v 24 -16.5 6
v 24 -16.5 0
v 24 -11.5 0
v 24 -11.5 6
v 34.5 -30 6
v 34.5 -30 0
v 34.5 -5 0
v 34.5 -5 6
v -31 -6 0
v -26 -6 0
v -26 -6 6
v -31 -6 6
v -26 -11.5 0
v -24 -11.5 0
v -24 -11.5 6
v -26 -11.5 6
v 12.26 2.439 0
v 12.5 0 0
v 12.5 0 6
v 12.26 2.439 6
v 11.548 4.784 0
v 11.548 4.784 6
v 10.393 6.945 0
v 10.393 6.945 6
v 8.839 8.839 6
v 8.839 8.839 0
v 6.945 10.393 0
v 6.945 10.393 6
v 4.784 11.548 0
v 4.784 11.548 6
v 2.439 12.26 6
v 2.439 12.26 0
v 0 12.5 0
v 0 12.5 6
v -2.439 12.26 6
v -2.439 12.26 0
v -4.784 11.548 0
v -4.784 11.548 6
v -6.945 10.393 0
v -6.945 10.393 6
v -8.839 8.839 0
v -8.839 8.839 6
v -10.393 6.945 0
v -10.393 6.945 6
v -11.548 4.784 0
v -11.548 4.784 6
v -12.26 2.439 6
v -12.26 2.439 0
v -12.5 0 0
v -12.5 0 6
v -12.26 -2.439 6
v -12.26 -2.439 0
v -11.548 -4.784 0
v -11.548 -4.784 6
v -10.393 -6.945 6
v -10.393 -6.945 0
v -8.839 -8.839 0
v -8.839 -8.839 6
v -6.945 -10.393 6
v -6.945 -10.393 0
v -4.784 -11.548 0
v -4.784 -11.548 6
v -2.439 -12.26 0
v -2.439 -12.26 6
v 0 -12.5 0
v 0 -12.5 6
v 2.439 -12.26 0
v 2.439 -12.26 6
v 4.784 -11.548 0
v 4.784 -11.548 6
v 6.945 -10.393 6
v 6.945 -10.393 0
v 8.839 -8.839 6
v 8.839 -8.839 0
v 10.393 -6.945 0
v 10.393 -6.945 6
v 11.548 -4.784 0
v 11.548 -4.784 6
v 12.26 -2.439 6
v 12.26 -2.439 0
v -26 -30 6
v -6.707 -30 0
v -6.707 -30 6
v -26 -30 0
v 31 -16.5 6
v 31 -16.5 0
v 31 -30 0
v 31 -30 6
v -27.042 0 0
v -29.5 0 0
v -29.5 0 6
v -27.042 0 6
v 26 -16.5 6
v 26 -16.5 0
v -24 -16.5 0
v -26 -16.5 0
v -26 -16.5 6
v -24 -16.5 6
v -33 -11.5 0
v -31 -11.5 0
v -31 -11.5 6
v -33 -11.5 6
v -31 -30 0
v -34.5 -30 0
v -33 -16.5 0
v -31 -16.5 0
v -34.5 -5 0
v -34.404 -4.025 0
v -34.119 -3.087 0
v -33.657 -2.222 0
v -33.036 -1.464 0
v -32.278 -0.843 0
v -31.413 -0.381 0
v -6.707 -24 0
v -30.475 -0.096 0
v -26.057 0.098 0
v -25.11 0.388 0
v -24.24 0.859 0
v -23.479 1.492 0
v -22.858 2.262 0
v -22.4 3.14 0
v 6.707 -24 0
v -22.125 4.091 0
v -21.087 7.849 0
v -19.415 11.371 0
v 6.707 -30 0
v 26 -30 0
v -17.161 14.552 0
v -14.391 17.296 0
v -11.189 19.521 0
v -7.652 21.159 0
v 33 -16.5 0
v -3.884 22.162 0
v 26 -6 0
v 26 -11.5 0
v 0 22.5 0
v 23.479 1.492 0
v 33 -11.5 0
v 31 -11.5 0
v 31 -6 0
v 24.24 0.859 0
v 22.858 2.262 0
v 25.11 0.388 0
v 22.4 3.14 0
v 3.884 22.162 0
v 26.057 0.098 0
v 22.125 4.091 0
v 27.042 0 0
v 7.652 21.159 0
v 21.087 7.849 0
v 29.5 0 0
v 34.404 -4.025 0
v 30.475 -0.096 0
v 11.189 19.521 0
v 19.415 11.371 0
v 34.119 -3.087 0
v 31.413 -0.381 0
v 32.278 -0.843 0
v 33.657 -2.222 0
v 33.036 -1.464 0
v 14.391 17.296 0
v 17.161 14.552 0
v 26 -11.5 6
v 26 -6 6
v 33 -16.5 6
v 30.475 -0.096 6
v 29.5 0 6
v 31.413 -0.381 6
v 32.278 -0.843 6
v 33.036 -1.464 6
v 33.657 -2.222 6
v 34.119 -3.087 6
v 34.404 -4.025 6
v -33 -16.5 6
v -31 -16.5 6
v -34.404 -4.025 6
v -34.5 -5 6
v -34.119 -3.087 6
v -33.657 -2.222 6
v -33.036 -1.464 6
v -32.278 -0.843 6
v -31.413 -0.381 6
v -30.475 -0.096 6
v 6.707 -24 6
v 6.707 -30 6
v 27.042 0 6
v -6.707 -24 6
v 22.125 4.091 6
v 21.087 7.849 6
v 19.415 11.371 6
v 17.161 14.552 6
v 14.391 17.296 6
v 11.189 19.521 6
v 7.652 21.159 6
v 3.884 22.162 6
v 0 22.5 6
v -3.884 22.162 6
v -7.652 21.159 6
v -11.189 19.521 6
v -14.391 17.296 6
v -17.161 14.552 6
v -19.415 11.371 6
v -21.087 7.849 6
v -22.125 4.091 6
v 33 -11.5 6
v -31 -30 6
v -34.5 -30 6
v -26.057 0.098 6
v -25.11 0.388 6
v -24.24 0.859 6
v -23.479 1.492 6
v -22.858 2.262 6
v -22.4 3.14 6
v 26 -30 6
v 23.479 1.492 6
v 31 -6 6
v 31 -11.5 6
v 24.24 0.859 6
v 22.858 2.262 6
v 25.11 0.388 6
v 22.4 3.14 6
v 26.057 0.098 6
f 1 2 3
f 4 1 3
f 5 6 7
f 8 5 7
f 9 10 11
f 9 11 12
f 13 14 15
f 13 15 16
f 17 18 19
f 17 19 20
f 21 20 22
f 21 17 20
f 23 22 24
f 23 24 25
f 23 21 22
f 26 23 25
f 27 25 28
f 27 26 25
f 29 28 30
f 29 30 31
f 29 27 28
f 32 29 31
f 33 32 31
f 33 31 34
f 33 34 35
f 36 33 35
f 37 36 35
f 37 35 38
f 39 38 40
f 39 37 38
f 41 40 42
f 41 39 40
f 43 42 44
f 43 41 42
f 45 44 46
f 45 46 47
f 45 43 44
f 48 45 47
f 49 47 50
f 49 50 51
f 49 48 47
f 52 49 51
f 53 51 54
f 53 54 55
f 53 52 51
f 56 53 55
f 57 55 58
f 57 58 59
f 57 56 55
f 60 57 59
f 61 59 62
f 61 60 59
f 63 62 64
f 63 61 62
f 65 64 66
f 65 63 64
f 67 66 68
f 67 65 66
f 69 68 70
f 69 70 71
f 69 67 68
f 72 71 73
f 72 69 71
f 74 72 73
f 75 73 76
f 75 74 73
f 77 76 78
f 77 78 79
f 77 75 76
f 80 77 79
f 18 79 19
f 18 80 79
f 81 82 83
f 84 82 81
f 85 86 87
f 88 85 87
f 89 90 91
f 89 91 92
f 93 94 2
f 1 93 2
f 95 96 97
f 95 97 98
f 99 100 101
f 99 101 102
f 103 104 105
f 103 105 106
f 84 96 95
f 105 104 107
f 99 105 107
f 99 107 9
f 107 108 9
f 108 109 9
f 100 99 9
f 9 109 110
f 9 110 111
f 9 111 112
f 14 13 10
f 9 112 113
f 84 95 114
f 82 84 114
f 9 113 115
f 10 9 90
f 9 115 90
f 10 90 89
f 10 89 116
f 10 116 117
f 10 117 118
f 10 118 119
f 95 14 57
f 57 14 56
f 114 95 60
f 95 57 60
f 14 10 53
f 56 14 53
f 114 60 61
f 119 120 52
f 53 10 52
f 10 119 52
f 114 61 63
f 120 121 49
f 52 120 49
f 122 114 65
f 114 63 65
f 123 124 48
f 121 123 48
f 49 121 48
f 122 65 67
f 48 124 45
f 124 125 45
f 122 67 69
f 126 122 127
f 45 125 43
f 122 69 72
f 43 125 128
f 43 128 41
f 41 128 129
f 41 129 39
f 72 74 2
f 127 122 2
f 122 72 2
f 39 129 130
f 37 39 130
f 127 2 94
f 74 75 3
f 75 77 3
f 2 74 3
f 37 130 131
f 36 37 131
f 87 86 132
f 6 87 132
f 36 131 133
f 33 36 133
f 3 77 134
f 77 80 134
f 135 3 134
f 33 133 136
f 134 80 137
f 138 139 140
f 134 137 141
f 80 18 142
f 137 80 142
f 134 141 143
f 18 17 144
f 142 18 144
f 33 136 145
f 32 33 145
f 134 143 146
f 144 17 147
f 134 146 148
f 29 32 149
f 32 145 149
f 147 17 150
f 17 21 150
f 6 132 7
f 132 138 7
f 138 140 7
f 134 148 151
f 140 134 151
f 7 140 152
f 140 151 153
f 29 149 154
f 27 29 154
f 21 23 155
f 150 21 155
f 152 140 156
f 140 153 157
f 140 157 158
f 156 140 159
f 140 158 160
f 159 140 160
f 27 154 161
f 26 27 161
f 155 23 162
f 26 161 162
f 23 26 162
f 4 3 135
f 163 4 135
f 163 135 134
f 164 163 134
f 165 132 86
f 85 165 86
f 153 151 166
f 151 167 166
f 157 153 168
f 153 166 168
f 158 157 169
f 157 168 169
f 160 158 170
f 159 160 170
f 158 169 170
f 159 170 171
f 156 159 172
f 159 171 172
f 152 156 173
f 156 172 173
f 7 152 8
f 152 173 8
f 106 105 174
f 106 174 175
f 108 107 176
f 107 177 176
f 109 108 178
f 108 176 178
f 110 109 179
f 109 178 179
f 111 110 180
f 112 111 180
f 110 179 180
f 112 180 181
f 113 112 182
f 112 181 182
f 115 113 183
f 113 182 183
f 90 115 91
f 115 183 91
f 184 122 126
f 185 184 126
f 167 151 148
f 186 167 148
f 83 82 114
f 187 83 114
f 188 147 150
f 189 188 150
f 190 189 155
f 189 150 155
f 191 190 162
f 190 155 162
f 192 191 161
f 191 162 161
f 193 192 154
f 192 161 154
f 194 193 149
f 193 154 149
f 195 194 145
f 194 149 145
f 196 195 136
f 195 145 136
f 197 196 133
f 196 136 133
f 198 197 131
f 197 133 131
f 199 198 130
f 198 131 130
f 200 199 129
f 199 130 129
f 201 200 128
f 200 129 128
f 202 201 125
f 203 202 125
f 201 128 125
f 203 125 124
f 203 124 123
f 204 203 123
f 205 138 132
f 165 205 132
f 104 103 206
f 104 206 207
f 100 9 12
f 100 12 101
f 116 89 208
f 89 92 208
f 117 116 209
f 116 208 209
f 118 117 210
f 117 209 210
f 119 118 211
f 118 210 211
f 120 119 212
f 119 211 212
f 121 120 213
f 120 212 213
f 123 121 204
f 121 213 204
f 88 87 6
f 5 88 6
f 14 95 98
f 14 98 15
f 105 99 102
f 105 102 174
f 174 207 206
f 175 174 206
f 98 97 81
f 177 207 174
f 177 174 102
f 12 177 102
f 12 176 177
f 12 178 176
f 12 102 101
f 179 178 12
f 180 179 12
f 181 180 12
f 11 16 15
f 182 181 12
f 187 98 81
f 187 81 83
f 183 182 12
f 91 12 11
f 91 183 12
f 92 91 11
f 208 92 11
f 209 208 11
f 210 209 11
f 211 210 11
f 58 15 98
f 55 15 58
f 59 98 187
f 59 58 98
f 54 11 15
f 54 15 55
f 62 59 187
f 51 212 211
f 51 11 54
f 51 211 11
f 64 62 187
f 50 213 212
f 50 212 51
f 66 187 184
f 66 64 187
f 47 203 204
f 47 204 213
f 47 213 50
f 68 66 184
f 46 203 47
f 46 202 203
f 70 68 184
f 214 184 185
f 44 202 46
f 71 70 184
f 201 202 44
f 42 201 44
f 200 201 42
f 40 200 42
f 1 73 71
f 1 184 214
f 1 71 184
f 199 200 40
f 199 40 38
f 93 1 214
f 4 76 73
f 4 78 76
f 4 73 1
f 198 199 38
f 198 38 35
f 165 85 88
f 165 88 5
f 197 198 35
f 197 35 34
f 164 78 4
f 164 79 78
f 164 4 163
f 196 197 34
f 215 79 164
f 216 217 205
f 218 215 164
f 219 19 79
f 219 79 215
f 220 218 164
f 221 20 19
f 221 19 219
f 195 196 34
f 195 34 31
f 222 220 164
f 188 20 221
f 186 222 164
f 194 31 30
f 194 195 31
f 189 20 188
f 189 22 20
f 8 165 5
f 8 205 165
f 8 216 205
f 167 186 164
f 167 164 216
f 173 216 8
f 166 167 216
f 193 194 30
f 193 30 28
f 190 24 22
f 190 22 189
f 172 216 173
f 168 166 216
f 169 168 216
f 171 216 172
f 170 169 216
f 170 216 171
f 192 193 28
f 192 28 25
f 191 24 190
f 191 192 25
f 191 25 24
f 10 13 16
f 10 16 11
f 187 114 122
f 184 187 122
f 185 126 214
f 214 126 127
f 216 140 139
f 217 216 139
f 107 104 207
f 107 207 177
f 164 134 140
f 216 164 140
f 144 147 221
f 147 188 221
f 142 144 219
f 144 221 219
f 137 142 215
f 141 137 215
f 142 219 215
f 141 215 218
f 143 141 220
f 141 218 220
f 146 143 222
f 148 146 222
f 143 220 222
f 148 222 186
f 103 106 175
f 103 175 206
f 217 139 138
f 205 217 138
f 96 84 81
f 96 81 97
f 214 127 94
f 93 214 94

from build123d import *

# Parameters (mm, degrees)
SKETCH1_R           = 12.5
BOSS_EXTRUDE1_DEPTH = 6
BOSS_EXTRUDE2_DEPTH = 6
FILLET1_R           = 5


with BuildPart() as part:
    # Sketch1 → Boss-Extrude1 (new body)
    with BuildSketch(Plane.XY):
        with BuildLine():
            Line((-22.5, 0), (-22.5, -30))
            Line((-22.5, -30), (-6.707199182, -30))
            Line((-6.707199182, -30), (-6.707199182, -24))
            Line((-6.707199182, -24), (6.707199182, -24))
            Line((6.707199182, -24), (6.707199182, -30))
            Line((6.707199182, -30), (22.5, -30))
            Line((22.5, -30), (22.5, 0))
            ThreePointArc((22.5, 0), (0, 22.5), (-22.5, 0))
        make_face()
        Circle(SKETCH1_R, mode=Mode.SUBTRACT)
    extrude(amount=BOSS_EXTRUDE1_DEPTH)

    # Sketch2 → Boss-Extrude2 (add)
    with BuildSketch(Plane.XY):
        Polygon((-22.5, -30), (-26, -30), (-26, -16.5), (-24, -16.5), (-24, -11.5), (-26, -11.5), (-26, -6), (-31, -6), (-31, -11.5), (-33, -11.5), (-33, -16.5), (-31, -16.5), (-31, -30), (-34.5, -30), (-34.5, 0), (-22.5, 0), align=None)
    boss_extrude2 = extrude(amount=BOSS_EXTRUDE2_DEPTH)

    # Mirror1: Boss-Extrude2 across plane
    add(boss_extrude2.mirror(Plane(origin=(0, 0, 0), x_dir=(0, 0, 1), z_dir=(1, 0, 0))))

    # Fillet1
    fillet1_edges = [part.edges().sort_by_distance(p)[0] for p in [
        (22.5, 0, 3),
        (-22.5, 0, 3),
        (-34.5, 0, 3),
        (34.5, 0, 3),
    ]]
    fillet(fillet1_edges, radius=FILLET1_R)


solid = part.part
